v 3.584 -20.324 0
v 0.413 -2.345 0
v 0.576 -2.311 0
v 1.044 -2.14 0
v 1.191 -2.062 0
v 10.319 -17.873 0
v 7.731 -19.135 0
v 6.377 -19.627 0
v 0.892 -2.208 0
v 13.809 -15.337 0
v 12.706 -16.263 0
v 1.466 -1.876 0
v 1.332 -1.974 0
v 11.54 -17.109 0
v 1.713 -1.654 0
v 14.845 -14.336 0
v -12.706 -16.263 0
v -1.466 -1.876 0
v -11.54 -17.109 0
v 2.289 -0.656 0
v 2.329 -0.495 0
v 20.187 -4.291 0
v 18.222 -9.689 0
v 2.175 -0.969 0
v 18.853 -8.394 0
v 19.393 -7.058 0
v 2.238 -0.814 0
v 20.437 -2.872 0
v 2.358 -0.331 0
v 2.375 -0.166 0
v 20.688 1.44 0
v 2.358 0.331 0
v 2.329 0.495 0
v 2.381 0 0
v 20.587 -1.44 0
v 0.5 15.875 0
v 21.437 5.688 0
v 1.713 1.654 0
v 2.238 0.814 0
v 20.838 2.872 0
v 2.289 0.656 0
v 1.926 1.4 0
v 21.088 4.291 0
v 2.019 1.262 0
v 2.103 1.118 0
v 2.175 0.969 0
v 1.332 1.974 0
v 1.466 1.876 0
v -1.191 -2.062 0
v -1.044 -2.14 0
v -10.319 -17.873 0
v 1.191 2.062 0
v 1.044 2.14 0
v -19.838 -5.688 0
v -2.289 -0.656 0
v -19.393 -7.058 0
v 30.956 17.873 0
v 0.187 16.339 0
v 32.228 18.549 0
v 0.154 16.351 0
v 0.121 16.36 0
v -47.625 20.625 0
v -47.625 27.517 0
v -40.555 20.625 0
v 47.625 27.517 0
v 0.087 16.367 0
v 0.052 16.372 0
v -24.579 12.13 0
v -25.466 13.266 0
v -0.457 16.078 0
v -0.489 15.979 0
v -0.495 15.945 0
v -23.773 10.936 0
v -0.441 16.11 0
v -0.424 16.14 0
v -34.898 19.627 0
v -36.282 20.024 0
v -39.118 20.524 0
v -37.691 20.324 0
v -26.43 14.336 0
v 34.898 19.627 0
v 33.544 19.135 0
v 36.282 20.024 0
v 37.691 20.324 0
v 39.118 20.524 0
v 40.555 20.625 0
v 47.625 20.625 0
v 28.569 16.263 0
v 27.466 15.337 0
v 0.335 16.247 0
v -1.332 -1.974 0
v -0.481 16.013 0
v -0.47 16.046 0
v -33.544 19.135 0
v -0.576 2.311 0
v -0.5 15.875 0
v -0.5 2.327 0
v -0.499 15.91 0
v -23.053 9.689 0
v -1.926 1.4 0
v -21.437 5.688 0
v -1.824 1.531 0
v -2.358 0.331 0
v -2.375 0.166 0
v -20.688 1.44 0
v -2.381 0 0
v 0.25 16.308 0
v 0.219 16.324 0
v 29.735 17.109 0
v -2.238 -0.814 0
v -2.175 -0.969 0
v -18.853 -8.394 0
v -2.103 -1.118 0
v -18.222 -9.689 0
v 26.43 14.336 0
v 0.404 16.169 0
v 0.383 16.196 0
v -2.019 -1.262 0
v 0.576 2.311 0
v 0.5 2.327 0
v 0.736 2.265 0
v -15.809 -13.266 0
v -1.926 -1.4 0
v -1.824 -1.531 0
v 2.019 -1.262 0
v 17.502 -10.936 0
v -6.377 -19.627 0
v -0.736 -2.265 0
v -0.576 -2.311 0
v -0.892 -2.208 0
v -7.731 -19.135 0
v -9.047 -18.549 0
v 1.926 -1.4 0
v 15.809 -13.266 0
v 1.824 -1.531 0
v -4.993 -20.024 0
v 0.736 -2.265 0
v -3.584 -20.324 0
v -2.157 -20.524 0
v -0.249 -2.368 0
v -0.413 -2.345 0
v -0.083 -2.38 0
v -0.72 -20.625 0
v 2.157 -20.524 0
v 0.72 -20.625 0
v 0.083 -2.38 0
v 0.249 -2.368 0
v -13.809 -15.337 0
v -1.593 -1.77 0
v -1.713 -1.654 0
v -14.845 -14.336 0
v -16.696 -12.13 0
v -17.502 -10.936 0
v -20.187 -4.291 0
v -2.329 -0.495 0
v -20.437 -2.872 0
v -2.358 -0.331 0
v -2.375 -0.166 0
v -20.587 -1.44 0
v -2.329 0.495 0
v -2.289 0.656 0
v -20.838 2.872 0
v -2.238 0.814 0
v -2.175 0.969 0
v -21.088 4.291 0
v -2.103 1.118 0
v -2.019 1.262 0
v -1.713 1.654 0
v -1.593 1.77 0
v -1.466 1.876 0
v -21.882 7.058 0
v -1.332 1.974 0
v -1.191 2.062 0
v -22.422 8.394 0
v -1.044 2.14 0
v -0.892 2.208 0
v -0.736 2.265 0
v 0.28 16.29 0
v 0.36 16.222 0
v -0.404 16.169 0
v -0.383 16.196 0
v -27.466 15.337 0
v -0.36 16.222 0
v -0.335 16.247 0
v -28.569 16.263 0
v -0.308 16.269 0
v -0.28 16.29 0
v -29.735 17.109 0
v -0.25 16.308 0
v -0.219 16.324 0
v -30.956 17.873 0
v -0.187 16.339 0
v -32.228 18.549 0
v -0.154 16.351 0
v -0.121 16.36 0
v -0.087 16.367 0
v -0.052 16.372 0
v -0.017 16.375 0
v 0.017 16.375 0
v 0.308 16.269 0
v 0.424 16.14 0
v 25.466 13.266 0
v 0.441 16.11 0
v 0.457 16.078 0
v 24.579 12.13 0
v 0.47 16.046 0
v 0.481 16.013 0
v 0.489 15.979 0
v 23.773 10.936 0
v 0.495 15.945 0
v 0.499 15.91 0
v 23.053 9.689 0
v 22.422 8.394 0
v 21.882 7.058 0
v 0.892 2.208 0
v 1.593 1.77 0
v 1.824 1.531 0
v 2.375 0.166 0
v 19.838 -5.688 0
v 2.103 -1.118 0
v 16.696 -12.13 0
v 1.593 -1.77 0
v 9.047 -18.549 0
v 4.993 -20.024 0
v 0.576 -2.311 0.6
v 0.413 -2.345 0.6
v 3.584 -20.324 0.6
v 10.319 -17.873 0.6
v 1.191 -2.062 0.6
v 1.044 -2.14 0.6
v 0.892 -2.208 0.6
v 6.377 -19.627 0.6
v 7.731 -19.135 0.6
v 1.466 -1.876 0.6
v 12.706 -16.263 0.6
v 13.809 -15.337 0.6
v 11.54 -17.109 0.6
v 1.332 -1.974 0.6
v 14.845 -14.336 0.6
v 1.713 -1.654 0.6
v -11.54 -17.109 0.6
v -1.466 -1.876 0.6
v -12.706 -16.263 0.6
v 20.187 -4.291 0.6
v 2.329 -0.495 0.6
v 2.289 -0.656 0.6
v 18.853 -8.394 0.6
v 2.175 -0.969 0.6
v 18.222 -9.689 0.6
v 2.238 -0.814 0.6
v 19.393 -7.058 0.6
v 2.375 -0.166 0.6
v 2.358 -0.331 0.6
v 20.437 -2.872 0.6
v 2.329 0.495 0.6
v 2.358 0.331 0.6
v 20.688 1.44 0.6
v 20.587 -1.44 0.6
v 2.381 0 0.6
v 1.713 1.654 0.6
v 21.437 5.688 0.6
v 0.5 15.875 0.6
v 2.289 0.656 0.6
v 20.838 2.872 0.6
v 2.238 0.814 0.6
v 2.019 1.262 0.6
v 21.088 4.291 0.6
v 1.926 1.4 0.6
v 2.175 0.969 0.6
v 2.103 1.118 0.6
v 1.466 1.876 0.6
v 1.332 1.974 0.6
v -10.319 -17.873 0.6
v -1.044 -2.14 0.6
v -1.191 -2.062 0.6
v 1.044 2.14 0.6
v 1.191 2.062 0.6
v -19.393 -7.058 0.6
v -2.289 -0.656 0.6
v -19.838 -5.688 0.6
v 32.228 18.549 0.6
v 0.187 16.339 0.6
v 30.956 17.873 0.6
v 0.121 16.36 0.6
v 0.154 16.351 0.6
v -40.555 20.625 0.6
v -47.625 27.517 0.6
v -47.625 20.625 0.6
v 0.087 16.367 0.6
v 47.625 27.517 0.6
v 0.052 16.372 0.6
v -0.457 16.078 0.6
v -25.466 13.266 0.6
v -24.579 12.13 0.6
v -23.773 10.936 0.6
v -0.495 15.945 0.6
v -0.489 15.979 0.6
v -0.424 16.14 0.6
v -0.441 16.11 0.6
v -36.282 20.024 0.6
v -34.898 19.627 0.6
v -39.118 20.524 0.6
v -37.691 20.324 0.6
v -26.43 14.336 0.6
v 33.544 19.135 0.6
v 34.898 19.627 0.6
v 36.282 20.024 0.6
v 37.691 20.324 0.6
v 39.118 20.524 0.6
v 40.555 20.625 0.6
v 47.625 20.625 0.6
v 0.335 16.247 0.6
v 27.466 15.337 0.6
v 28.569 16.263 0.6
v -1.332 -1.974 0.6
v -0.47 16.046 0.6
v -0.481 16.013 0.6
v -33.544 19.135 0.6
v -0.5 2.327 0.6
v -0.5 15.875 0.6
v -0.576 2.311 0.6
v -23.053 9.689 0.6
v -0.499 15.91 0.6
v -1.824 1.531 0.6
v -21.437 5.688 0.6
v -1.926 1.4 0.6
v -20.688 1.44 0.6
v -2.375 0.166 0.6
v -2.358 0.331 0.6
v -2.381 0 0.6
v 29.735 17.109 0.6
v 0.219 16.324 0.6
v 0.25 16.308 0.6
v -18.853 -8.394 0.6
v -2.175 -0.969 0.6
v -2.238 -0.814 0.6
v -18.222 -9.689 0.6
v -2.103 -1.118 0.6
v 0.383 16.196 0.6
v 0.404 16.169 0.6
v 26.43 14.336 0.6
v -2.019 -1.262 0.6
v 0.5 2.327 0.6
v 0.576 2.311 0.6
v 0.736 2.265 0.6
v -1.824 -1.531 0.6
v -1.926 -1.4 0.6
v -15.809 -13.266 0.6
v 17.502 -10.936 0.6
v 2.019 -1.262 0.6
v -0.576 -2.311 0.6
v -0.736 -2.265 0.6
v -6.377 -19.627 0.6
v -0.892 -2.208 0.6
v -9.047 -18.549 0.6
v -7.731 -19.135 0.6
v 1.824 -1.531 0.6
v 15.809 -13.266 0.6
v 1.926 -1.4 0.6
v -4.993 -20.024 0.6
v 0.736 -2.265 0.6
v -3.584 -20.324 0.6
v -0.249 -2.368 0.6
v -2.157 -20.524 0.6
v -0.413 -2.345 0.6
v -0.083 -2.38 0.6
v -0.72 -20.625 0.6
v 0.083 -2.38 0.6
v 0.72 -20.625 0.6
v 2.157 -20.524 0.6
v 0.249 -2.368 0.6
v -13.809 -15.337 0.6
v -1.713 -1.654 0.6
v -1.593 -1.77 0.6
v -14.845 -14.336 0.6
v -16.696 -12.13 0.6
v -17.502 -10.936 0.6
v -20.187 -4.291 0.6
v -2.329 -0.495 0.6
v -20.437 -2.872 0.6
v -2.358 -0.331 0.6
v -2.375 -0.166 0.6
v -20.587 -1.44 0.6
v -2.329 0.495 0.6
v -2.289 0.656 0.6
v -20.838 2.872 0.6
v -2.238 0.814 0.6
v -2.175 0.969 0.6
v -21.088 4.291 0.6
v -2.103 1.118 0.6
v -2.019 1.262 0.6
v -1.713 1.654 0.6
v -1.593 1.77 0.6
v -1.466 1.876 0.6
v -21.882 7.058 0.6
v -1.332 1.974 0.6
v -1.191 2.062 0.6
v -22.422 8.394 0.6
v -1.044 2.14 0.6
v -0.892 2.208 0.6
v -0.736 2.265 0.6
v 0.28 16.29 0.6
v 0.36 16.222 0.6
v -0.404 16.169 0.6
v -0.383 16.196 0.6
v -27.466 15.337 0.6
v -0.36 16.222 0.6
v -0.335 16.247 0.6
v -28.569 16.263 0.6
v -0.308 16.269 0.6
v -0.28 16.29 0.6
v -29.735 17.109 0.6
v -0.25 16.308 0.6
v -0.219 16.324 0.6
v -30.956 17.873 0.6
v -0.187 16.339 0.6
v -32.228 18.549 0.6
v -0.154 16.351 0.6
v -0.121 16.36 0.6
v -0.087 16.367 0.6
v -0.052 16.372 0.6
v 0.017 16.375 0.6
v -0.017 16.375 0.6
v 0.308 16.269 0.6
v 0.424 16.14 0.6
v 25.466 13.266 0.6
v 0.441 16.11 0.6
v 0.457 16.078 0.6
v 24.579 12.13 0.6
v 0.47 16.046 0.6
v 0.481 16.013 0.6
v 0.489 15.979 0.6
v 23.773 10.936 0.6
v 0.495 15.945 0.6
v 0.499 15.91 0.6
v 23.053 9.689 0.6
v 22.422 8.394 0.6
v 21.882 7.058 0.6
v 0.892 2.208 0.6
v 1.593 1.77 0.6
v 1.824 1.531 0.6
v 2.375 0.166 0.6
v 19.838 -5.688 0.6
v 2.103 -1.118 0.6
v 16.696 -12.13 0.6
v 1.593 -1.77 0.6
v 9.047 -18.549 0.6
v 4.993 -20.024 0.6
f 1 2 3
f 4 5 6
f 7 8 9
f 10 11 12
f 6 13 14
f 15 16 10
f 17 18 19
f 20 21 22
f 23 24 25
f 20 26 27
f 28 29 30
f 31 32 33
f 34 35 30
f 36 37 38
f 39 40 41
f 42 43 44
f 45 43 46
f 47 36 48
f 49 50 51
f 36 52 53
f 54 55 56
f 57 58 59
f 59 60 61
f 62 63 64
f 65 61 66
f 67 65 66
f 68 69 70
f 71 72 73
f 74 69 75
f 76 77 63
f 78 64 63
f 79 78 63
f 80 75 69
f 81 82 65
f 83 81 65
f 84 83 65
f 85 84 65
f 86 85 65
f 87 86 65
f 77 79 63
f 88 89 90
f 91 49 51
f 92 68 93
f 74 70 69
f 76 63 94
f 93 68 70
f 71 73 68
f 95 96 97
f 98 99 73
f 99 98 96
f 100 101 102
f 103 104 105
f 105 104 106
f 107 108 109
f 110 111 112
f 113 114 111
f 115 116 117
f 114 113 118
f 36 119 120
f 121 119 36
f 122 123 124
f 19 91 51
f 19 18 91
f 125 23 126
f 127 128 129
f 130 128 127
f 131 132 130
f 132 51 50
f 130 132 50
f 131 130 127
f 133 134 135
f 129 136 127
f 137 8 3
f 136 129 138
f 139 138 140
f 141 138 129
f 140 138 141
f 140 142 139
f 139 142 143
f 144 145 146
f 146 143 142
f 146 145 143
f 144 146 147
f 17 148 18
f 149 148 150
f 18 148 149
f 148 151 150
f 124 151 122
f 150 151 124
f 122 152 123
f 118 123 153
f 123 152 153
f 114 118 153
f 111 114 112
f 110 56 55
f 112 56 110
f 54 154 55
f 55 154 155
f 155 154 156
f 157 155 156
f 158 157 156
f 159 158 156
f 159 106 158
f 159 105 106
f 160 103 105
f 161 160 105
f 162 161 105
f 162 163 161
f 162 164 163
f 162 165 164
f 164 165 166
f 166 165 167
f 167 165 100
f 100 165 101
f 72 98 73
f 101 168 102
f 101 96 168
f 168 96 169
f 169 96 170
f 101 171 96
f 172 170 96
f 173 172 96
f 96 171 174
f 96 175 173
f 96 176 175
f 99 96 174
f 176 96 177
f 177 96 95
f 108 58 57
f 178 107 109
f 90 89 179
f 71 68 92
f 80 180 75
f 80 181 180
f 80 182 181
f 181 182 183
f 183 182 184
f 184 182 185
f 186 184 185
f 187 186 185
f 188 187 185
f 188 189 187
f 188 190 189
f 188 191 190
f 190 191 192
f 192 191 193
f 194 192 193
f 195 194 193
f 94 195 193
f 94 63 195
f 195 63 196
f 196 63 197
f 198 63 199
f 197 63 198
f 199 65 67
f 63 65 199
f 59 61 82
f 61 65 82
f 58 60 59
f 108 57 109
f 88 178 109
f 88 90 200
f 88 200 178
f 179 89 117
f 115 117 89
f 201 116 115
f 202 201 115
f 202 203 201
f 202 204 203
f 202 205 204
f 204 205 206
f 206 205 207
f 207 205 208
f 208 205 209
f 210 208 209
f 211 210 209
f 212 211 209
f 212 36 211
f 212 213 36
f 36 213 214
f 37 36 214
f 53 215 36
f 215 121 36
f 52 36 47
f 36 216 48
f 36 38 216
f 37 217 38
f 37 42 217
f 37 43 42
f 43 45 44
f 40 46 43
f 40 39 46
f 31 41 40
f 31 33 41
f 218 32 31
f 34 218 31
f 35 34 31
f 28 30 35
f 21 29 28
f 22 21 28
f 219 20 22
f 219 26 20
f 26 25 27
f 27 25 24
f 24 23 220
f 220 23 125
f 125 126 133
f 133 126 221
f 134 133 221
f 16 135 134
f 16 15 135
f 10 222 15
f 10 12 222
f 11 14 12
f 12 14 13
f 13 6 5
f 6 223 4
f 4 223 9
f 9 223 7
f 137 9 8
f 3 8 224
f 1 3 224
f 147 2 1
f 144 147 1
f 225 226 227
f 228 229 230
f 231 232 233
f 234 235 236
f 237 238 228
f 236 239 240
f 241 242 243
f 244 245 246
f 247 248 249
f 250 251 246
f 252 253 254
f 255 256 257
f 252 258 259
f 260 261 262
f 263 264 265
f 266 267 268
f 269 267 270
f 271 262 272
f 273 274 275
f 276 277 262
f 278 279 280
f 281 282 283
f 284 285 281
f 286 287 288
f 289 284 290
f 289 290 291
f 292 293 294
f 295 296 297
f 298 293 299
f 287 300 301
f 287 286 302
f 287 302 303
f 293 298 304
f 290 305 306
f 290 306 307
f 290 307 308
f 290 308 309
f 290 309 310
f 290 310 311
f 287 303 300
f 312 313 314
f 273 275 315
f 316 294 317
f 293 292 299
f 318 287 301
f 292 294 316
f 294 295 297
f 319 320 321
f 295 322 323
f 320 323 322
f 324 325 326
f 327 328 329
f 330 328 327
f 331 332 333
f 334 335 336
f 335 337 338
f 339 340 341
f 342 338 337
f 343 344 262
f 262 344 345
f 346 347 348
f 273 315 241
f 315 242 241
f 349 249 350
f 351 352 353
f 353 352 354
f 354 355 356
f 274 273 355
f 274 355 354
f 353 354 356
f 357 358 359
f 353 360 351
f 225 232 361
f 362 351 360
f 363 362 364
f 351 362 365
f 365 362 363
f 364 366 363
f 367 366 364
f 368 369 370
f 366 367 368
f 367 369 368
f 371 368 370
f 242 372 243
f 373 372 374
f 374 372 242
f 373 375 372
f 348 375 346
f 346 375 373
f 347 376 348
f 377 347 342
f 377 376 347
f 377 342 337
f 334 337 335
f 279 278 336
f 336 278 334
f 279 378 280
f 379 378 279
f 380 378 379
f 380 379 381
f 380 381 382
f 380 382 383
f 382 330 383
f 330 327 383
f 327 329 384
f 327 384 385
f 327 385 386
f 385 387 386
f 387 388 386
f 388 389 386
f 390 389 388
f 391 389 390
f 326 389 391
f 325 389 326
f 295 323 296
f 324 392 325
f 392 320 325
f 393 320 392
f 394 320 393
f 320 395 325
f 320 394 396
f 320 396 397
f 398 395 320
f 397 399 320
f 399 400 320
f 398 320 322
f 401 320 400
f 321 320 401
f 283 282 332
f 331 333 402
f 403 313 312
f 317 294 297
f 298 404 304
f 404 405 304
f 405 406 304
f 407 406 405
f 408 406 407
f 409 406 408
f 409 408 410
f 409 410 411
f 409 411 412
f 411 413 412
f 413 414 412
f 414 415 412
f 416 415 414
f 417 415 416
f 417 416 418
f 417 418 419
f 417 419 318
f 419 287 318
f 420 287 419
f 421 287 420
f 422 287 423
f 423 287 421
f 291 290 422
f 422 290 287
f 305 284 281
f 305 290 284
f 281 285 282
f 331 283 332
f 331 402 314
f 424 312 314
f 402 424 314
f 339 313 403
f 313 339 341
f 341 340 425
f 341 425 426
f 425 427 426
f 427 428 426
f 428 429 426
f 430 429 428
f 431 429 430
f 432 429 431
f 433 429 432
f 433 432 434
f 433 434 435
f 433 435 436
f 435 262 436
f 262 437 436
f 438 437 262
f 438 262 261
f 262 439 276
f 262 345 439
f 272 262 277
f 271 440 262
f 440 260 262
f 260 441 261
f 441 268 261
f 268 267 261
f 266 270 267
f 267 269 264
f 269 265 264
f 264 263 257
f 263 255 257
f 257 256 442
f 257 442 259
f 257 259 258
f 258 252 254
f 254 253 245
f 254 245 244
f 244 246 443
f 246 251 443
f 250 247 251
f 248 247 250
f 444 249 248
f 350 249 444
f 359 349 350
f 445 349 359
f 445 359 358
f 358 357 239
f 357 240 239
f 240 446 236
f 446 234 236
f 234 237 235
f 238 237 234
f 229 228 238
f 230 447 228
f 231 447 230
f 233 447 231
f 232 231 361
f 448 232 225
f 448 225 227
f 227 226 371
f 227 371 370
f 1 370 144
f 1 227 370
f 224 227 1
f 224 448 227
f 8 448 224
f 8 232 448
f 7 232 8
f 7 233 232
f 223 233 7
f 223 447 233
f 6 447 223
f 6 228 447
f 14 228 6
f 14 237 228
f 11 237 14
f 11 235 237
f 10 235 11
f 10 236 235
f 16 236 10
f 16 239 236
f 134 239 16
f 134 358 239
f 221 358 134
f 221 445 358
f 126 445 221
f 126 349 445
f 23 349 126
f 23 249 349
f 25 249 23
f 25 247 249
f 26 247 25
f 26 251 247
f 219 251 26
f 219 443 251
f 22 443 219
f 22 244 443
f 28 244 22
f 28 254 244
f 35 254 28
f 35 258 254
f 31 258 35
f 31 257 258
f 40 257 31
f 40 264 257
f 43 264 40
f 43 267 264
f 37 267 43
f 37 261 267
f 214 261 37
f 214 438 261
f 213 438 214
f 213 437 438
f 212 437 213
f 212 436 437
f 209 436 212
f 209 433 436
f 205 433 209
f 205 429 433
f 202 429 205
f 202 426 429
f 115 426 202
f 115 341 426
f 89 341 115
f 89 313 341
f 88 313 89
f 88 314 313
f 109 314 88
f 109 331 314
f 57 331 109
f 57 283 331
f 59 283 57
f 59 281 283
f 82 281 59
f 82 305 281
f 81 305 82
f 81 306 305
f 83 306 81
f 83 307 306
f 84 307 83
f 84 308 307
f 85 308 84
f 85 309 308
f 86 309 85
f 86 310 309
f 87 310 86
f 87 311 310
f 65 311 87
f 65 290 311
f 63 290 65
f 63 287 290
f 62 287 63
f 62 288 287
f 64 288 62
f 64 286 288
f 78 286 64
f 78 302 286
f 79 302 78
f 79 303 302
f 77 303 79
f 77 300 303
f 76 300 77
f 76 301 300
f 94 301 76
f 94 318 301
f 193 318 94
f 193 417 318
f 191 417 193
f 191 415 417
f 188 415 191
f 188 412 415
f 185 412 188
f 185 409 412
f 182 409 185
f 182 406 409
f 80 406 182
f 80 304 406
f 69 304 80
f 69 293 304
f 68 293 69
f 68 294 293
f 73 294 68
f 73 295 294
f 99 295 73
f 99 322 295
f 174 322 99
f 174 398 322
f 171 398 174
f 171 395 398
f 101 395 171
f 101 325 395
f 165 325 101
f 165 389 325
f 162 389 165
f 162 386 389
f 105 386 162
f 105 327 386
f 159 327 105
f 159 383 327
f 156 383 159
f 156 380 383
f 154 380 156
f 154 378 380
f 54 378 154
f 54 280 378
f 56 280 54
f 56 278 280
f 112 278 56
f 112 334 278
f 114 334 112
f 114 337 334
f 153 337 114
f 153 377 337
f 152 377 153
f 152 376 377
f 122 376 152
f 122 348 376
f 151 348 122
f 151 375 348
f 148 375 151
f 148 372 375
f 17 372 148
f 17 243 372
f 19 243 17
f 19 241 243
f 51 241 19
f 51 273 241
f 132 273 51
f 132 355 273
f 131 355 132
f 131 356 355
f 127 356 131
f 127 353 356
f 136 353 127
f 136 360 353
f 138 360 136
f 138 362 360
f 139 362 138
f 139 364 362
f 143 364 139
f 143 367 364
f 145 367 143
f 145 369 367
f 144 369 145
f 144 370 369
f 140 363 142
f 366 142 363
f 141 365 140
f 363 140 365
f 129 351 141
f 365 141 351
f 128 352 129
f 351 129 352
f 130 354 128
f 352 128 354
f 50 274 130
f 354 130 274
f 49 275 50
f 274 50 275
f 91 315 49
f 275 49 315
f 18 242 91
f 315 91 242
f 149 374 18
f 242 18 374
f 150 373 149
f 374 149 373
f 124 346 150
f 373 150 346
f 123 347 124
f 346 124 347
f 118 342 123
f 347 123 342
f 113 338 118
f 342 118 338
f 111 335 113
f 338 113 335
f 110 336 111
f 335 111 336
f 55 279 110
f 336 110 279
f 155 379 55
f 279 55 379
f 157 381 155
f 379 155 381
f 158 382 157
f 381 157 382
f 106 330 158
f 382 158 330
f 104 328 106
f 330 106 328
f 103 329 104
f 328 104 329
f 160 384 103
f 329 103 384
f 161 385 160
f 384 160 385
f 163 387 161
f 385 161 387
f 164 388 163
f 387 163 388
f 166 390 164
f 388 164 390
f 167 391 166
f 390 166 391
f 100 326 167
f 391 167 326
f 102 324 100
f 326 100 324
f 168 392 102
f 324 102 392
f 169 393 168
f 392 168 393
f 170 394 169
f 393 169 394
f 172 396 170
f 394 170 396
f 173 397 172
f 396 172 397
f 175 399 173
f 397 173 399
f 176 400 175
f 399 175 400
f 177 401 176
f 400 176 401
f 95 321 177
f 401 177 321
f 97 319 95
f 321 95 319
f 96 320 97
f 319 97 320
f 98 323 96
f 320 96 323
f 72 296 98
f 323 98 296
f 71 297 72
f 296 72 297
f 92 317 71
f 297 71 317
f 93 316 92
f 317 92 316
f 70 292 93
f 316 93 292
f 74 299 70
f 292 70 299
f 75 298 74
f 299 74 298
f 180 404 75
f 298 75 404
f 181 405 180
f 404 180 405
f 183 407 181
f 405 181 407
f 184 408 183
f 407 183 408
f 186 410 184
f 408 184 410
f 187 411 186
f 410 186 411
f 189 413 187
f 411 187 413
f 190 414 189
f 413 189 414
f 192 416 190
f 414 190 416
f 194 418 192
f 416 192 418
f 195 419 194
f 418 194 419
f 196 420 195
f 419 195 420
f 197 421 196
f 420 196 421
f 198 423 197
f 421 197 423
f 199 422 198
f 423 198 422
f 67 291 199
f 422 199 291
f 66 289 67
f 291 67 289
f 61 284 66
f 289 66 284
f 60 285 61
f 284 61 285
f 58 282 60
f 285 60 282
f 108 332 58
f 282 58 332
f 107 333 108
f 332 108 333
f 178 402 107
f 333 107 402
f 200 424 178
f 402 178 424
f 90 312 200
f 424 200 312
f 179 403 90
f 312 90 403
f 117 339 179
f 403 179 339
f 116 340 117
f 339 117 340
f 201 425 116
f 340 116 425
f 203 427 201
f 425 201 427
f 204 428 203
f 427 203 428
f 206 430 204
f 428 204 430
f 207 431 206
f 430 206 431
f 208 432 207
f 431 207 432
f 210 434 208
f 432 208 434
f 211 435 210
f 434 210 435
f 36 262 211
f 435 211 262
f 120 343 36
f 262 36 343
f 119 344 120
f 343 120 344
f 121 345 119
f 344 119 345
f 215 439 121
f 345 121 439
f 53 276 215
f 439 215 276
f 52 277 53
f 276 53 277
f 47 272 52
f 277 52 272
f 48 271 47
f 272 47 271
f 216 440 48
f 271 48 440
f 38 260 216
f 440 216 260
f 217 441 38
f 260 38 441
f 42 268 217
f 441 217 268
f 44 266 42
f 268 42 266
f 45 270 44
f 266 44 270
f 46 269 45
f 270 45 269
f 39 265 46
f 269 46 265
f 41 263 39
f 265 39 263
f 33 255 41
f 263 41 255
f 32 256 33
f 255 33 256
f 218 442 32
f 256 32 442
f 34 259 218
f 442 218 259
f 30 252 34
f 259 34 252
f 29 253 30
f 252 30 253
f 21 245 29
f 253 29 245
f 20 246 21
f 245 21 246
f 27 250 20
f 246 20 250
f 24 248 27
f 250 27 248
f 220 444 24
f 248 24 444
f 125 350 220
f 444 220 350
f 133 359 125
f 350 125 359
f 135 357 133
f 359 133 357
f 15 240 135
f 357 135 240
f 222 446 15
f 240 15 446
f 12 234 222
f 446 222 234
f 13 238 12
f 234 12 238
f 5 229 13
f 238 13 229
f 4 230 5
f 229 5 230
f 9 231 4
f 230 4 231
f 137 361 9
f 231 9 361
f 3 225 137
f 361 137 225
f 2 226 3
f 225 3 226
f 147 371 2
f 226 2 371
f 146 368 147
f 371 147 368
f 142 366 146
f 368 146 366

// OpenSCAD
$fn=90;
in=25.4;
strap=(1+5/8)*in;

button_hole=3/16*in;
button_slot=1;
button_slot_h=5/8*in;

flat=strap/3*2;

wing_h=strap/2;
wing=flat-wing_h;

// extra material to account for fold, may be trimmed
wing_extra=in/4;

line=3;

module dirror_x() {
	children();
	mirror([1,0])
	children();
}

module body() {
	circle(d=strap);
	translate([-strap/2,0])
	square([strap,flat]);

	dirror_x()
	difference() {
		translate([strap/2,0])
		square([strap/2+wing_extra,wing+wing_h]);

		hull() {
			translate([strap,0])
			circle(r=wing_h);
			translate([strap+wing_extra*2,0])
			circle(r=wing_h);
		}
	}
}

module slot() {
	circle(d=button_hole); hull() {
		translate([0,button_slot_h])
		circle(d=button_slot);
		circle(d=button_slot);
	}

}

module twod() {
	difference() {
		body();
		slot();
	}
}

module line() {
	difference() {
		offset(line/2)
		children();
		offset(-line/2)
		children();
	}
}

//line() body();
//slot();

linear_extrude(height=0.6)
twod();
